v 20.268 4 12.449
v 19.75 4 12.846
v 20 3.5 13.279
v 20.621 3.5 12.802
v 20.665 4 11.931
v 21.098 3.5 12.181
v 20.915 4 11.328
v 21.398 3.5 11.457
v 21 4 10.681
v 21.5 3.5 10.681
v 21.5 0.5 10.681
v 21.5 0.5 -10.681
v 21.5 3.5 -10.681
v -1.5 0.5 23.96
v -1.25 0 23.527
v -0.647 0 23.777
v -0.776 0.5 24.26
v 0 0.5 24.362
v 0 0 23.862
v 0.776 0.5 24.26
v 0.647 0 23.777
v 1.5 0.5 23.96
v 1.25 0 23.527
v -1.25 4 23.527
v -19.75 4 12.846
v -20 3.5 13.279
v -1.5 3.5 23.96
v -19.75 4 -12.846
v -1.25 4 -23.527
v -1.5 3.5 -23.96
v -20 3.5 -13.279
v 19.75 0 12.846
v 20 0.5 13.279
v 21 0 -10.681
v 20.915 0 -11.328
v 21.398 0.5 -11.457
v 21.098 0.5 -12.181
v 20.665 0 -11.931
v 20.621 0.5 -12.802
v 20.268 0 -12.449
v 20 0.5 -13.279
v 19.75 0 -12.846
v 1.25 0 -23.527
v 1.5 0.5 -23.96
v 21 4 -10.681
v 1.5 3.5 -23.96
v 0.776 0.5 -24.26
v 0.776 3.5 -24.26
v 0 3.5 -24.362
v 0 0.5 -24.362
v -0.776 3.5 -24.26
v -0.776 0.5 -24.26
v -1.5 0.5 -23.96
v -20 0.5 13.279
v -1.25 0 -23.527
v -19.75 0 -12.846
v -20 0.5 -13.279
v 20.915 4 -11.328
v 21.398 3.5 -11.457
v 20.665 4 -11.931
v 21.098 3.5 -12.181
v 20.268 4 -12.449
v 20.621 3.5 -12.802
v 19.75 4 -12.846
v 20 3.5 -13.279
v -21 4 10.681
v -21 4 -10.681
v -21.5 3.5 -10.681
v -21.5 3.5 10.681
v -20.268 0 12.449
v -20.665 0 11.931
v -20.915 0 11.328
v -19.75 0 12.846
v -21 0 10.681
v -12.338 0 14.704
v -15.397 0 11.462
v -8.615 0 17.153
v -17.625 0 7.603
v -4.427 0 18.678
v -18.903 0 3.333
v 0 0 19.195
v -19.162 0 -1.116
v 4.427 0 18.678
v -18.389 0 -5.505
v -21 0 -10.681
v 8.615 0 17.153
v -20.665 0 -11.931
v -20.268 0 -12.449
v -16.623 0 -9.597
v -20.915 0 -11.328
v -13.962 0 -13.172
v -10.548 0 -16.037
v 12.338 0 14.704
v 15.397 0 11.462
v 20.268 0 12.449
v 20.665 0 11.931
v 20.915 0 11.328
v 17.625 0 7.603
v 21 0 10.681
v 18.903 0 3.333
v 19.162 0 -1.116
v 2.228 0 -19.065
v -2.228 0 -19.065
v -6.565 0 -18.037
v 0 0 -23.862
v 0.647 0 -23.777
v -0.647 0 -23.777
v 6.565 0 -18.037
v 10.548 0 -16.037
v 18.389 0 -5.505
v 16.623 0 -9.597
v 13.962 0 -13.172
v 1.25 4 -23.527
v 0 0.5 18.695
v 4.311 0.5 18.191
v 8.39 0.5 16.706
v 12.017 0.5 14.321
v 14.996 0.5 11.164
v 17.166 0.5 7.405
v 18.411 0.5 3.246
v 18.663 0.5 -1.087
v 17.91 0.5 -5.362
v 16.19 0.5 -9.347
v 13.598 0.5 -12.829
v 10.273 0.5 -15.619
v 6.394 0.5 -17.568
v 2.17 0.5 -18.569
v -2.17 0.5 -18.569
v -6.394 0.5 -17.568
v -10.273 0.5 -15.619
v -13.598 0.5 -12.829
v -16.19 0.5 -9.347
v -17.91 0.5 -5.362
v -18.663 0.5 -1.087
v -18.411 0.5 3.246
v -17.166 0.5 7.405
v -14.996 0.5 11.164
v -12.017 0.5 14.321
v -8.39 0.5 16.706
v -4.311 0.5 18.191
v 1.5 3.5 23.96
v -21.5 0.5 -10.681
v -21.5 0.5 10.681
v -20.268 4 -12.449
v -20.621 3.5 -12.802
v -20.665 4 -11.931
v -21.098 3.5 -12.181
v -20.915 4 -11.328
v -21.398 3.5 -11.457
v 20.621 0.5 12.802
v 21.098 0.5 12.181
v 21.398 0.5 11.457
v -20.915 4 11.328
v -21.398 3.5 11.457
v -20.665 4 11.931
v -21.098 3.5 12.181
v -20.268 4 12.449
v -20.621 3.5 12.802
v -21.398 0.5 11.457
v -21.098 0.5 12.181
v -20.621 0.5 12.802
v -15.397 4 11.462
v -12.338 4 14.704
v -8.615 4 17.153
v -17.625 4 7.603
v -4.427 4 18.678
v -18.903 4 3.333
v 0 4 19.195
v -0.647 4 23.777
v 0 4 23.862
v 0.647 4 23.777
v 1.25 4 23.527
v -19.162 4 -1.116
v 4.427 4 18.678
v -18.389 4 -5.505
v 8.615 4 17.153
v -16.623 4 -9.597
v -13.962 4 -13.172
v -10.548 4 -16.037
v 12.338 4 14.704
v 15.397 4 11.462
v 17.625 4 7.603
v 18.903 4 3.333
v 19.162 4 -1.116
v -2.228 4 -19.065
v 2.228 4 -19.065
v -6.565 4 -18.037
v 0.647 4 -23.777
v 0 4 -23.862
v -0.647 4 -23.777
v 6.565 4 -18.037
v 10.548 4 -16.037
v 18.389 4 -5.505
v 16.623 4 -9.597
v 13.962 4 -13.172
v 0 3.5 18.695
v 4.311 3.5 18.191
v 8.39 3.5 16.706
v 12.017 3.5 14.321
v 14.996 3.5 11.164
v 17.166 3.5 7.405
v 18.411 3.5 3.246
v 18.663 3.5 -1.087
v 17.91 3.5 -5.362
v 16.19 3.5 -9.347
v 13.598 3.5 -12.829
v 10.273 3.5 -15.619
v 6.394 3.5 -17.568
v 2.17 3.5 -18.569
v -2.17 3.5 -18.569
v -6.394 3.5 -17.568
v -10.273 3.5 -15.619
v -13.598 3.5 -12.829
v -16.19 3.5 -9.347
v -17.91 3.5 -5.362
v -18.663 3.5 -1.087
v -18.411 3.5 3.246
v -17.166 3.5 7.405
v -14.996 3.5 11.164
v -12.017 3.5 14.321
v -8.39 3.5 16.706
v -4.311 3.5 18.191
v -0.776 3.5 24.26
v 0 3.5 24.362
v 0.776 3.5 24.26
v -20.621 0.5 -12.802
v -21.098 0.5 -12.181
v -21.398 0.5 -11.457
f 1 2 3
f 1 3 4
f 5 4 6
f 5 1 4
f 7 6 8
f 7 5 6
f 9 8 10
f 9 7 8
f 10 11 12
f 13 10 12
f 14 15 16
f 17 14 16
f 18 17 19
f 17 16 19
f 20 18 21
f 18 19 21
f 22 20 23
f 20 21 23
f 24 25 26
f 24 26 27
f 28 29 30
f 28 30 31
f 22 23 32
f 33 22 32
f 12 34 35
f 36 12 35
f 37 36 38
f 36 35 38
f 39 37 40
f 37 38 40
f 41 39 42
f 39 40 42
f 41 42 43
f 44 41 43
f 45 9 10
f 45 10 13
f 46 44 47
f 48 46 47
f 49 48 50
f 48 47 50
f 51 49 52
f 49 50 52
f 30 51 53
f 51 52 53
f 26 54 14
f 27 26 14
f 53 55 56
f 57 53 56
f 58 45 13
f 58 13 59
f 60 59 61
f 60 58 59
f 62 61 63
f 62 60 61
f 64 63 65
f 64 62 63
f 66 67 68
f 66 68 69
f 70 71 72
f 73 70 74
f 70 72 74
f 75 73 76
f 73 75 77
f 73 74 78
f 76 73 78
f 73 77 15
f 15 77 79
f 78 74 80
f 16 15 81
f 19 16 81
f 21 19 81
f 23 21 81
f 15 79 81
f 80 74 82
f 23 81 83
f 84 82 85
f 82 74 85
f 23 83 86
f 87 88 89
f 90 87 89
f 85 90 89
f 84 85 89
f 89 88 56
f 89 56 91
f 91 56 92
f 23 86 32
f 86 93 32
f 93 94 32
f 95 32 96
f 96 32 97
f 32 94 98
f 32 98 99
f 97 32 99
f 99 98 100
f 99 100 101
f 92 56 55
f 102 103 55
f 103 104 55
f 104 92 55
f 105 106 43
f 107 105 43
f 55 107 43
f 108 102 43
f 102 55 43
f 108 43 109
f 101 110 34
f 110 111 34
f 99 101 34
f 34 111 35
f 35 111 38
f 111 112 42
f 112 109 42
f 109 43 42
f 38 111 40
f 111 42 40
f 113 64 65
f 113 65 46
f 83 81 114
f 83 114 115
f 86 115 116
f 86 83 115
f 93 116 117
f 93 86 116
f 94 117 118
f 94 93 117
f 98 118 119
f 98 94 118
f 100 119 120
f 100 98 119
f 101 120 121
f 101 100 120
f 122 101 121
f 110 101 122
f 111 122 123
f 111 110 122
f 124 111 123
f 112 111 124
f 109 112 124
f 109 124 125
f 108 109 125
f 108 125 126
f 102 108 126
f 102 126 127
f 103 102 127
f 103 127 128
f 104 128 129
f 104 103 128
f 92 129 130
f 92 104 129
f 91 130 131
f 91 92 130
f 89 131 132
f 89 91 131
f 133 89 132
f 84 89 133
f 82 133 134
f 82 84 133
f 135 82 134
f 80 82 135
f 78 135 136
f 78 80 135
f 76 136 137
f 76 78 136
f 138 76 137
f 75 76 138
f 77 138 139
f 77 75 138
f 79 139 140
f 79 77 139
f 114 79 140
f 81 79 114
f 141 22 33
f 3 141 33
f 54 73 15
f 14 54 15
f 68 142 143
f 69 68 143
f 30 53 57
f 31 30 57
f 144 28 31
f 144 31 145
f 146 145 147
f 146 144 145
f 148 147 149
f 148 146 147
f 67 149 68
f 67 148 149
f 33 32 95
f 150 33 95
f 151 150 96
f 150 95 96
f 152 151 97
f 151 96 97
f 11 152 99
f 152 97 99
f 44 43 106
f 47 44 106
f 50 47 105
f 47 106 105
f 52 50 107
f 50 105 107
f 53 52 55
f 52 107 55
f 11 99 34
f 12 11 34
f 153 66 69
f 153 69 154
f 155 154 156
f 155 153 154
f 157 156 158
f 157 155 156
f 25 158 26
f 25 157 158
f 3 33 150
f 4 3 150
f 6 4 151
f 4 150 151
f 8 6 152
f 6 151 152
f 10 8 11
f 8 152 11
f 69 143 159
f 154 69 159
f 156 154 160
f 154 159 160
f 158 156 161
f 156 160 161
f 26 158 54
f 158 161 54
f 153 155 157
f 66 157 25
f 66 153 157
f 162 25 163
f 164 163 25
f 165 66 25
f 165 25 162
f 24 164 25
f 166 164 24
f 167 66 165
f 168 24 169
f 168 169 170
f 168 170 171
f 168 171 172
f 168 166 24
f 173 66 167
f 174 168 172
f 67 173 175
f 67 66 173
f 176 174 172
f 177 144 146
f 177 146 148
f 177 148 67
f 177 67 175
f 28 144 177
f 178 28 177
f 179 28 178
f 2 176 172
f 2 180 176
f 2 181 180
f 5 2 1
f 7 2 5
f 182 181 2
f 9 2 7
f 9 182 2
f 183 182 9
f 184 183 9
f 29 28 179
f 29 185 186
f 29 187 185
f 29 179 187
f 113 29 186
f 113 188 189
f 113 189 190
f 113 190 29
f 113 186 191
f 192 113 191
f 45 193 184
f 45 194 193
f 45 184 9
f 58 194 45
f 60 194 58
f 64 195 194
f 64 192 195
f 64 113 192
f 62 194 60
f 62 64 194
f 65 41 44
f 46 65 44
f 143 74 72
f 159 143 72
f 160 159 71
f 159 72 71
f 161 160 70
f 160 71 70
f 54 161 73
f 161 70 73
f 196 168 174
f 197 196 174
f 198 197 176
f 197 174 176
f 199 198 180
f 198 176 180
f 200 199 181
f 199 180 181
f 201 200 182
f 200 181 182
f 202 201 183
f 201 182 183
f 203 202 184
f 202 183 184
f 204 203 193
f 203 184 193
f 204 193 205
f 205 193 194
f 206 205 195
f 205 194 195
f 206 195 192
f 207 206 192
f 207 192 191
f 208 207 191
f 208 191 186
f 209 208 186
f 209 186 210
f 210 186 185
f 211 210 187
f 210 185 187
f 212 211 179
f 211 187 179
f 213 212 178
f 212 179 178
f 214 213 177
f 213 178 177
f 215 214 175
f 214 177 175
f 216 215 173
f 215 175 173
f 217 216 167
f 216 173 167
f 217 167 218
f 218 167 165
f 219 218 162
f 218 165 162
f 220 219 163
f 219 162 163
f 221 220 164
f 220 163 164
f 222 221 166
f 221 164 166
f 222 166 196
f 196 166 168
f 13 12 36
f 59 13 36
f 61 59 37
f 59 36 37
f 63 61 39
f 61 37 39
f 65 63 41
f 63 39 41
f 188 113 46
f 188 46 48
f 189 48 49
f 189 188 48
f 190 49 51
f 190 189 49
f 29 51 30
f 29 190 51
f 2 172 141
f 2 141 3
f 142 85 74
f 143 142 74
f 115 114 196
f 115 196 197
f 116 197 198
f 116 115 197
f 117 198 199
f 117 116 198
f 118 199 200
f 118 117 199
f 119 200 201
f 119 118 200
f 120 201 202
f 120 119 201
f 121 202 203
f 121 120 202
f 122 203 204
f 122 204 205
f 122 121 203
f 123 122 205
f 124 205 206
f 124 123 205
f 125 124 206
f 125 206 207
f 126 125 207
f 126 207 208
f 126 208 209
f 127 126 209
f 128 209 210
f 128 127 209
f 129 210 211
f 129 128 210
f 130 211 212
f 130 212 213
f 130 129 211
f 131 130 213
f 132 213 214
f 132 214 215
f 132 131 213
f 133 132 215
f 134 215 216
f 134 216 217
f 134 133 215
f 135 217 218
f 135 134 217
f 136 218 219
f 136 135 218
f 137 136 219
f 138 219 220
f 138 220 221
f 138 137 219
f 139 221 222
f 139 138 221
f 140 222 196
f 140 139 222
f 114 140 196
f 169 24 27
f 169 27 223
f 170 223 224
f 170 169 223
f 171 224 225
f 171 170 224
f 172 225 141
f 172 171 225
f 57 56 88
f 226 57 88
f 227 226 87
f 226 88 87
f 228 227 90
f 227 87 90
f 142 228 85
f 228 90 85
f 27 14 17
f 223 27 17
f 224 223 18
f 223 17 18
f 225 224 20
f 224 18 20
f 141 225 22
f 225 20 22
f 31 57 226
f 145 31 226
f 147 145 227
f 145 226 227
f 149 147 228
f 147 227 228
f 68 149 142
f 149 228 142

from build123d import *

# Parameters (mm, degrees)
SKETCH1_R           = 18.694950994
BOSS_EXTRUDE1_DEPTH = 4
CHAMFER1_SIZE       = 0.5


with BuildPart() as part:
    # Sketch1 → Boss-Extrude1 (new body)
    with BuildSketch(Plane(origin=(0, 0, 0), x_dir=(1, 0, 0), z_dir=(0, 1, 0))):
        with BuildLine():
            Line((-1.5, 23.960036171), (-20, 13.279056191))
            ThreePointArc((-20, 13.279056191), (-21.098076211, 12.18097998), (-21.5, 10.68097998))
            Line((-21.5, 10.68097998), (-21.5, -10.68097998))
            ThreePointArc((-21.5, -10.68097998), (-21.098076211, -12.18097998), (-20, -13.279056191))
            Line((-20, -13.279056191), (-1.5, -23.960036171))
            ThreePointArc((-1.5, -23.960036171), (0, -24.36195996), (1.5, -23.960036171))
            Line((1.5, -23.960036171), (20, -13.279056191))
            ThreePointArc((20, -13.279056191), (21.098076211, -12.18097998), (21.5, -10.68097998))
            Line((21.5, -10.68097998), (21.5, 10.68097998))
            ThreePointArc((21.5, 10.68097998), (21.098076211, 12.18097998), (20, 13.279056191))
            Line((20, 13.279056191), (1.5, 23.960036171))
            ThreePointArc((1.5, 23.960036171), (0, 24.36195996), (-1.5, 23.960036171))
        make_face()
        with Locations(Location((0, 0, 0), (0, 0, 270))):
            Circle(SKETCH1_R, mode=Mode.SUBTRACT)
    extrude(amount=BOSS_EXTRUDE1_DEPTH)

    # Chamfer1
    chamfer1_edges = [part.edges().sort_by_distance(p)[0] for p in [
        (-21.098076211, 4, -12.18097998),
        (10.75, 0, -18.619546181),
        (21.098076211, 0, -12.18097998),
        (21.5, 0, 0),
        (21.098076211, 0, 12.18097998),
        (10.75, 0, 18.619546181),
        (0, 0, 24.36195996),
        (-21.5, 4, 0),
        (-10.75, 0, 18.619546181),
        (-21.098076211, 0, 12.18097998),
        (-21.5, 0, 0),
        (-21.098076211, 0, -12.18097998),
        (-10.75, 0, -18.619546181),
        (0, 0, -24.36195996),
        (-21.098076211, 4, 12.18097998),
        (-10.75, 4, 18.619546181),
        (0, 4, 24.36195996),
        (10.75, 4, 18.619546181),
        (21.098076211, 4, 12.18097998),
        (0, 0, -18.694950994),
        (0, 4, -18.694950994),
        (21.5, 4, 0),
        (21.098076211, 4, -12.18097998),
        (10.75, 4, -18.619546181),
        (0, 4, -24.36195996),
        (-10.75, 4, -18.619546181),
    ]]
    chamfer(chamfer1_edges, length=CHAMFER1_SIZE)


solid = part.part
